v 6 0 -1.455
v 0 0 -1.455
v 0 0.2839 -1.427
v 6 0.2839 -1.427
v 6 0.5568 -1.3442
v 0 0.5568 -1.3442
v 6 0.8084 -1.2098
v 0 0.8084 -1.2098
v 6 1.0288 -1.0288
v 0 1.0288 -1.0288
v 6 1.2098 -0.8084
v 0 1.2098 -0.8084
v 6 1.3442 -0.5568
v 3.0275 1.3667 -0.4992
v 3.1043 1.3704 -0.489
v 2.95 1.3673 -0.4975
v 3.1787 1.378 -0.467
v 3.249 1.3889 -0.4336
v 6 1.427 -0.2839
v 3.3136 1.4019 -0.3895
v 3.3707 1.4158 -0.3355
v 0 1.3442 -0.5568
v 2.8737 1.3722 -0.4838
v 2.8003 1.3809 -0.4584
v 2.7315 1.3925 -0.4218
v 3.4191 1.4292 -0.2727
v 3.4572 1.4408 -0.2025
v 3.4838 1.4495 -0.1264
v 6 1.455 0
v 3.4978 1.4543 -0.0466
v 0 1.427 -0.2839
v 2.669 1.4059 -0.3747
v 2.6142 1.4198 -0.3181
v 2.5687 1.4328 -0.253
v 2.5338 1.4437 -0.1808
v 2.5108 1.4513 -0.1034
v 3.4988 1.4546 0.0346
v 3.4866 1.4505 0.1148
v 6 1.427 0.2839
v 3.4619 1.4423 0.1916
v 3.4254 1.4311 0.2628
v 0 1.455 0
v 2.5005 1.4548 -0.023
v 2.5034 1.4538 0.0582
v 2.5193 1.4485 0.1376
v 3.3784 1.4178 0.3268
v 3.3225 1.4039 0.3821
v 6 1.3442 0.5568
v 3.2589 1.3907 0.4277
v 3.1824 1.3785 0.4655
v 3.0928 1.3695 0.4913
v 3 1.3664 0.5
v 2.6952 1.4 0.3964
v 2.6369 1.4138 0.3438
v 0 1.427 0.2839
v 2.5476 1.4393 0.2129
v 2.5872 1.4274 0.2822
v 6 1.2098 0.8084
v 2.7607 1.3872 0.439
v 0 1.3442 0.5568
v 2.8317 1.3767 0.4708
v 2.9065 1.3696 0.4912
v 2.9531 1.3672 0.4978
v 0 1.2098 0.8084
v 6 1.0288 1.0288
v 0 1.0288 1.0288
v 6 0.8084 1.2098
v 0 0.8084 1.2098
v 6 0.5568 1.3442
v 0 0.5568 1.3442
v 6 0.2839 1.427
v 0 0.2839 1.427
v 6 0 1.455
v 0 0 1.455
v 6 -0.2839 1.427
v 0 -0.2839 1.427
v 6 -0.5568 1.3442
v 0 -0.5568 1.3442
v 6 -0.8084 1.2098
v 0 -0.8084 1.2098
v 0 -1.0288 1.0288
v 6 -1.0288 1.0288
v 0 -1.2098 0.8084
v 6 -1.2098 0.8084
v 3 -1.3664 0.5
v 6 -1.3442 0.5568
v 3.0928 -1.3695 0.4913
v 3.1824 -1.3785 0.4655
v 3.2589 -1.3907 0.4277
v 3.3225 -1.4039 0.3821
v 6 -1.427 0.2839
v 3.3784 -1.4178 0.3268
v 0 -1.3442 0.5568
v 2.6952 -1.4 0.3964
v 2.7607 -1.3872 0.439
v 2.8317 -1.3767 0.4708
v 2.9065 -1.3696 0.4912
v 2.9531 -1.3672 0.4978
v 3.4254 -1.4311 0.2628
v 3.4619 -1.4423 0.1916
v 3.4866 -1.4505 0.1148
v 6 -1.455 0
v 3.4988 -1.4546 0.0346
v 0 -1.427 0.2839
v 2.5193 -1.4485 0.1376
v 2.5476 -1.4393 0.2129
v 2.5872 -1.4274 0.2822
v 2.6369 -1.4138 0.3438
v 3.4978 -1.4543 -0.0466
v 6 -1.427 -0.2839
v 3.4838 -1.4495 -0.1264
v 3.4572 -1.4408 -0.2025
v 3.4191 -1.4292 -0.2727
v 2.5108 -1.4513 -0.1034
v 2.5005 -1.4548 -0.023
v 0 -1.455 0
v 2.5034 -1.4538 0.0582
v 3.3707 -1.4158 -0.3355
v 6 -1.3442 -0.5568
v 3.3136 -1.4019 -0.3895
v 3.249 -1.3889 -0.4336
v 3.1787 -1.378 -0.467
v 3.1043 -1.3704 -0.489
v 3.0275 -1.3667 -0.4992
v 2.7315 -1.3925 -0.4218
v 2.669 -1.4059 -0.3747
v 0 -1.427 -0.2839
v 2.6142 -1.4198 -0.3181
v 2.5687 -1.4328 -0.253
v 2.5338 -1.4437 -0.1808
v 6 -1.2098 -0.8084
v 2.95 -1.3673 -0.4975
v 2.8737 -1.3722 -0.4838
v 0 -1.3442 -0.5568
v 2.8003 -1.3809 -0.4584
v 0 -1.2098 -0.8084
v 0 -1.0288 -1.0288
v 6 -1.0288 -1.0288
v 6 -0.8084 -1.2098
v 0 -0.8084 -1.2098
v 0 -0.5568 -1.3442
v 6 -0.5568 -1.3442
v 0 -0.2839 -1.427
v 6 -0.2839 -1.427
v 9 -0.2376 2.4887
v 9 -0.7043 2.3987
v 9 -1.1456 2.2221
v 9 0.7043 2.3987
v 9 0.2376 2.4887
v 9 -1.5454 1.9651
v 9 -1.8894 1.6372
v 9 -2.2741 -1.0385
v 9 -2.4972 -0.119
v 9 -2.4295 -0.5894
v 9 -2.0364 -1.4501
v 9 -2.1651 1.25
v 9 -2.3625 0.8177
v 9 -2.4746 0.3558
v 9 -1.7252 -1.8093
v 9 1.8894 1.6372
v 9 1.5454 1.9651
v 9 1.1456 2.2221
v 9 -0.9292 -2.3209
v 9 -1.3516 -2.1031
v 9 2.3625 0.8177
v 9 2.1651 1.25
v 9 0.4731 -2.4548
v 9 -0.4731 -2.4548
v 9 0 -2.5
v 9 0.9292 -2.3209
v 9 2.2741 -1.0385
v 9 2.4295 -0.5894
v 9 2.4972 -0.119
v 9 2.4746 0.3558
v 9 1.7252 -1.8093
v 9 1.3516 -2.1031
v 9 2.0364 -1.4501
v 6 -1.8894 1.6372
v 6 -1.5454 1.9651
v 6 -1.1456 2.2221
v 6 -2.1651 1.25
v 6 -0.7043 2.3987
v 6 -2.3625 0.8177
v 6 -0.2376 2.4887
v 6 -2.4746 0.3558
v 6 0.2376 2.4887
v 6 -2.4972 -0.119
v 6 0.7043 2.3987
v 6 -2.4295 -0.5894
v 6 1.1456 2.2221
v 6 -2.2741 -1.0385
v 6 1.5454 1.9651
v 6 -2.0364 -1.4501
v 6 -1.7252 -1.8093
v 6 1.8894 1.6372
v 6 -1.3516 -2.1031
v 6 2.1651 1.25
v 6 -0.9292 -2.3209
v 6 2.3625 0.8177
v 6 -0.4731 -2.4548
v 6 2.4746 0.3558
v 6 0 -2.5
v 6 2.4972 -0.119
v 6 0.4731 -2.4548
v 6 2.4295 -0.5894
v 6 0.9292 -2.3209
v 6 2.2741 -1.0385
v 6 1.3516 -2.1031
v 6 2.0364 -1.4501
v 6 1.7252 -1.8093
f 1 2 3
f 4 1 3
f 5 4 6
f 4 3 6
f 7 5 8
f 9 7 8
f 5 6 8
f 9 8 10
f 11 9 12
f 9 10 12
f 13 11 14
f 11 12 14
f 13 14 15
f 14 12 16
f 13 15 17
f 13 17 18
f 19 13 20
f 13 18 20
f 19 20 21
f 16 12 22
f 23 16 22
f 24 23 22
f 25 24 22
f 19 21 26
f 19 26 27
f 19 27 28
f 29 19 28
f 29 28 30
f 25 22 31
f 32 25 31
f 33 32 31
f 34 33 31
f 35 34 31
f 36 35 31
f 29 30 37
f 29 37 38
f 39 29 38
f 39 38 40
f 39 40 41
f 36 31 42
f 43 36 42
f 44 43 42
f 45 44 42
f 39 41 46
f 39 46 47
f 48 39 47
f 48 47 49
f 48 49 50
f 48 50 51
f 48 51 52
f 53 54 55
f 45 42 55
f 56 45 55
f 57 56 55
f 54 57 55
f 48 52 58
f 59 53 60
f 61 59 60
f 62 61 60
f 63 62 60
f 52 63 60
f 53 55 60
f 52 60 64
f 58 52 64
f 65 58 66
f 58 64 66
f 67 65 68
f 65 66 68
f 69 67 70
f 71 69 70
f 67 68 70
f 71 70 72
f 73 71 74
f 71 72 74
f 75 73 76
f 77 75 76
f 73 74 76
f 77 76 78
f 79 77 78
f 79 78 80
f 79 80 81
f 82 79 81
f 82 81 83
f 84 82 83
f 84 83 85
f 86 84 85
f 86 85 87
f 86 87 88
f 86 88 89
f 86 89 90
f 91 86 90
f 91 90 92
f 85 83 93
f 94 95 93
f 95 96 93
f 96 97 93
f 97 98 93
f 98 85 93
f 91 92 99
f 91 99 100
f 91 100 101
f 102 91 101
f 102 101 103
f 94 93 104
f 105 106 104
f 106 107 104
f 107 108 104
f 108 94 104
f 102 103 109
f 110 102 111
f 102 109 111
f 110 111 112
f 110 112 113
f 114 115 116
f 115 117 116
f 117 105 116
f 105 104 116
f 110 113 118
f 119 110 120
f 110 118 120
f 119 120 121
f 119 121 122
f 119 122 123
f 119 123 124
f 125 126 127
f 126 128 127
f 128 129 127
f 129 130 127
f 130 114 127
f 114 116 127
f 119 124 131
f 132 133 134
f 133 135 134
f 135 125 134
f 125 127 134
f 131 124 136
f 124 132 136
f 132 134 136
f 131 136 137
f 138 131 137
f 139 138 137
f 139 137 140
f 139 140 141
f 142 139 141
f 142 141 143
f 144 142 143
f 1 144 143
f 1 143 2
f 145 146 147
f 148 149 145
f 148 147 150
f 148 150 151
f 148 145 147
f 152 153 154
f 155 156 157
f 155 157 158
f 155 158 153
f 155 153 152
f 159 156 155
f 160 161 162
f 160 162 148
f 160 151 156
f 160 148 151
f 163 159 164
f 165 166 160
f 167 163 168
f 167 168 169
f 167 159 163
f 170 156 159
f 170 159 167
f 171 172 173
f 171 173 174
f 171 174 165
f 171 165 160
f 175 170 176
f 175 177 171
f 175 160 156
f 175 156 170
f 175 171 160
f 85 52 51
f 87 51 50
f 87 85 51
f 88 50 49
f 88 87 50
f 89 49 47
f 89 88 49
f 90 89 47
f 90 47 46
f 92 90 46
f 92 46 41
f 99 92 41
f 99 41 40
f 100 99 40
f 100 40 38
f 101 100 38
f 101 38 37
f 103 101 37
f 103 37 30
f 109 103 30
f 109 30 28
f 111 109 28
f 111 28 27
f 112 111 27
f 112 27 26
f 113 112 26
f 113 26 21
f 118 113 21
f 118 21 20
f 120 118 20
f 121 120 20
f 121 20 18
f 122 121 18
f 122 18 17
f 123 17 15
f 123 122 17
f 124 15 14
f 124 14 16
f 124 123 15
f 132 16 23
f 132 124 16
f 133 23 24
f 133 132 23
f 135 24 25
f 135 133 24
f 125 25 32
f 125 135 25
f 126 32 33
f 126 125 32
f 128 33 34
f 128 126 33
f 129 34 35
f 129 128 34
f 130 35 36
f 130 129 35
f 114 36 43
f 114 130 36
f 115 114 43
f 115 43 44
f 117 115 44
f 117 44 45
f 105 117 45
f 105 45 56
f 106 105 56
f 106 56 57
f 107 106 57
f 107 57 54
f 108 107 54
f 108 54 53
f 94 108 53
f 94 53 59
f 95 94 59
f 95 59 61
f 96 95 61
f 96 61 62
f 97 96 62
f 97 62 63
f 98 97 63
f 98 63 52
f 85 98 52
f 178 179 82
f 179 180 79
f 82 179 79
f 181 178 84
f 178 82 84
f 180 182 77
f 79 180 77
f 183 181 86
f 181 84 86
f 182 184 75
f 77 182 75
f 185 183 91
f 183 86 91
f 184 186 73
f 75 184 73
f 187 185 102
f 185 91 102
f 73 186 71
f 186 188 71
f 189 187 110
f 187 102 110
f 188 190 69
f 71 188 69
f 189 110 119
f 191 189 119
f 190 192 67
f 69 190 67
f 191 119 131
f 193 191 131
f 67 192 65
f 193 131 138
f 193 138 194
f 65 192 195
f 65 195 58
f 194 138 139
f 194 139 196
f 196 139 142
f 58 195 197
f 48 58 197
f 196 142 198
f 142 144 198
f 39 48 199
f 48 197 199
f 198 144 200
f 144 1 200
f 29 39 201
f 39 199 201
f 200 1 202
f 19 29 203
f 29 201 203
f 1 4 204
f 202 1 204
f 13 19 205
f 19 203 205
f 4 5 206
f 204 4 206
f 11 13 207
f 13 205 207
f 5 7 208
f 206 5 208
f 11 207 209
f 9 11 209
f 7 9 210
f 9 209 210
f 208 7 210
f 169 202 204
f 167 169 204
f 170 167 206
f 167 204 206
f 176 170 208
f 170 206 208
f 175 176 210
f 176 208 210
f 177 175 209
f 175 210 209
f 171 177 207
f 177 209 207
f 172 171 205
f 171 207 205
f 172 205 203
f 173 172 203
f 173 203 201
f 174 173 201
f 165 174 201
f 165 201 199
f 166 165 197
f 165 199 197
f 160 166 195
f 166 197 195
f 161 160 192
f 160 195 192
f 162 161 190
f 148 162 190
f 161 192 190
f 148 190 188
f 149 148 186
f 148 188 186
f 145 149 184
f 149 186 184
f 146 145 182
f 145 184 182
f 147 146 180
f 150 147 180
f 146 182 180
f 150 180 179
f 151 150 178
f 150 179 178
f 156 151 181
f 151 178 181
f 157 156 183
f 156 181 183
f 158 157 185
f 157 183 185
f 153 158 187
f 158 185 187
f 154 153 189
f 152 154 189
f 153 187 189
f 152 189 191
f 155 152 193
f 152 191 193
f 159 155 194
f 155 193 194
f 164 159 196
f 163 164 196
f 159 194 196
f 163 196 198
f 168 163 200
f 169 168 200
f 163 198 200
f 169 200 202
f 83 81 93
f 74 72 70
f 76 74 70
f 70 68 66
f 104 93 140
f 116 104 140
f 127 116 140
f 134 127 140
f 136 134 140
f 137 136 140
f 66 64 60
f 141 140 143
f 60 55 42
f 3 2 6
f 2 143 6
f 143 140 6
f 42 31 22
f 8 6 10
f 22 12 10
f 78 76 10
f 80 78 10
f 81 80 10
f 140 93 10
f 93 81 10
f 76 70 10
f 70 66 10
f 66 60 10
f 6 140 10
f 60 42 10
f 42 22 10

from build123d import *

# Parameters (mm, degrees)
SKETCH2_R               = 1.455
BOSS_EXTRUDE3_DEPTH     = 6
SKETCH3_R               = 2.5
BOSS_EXTRUDE4_DEPTH     = 3
CUT_EXTRUDE1_DEPTH      = 10.669539803
CUT_EXTRUDE1_DEPTH_BACK = 10.669539803
SKETCH4_R               = 0.5


with BuildPart() as part:
    # Sketch2 → Boss-Extrude3 (new body)
    with BuildSketch(Plane(origin=(0, 0, 0), x_dir=(0, 0, -1), z_dir=(1, 0, 0))):
        Circle(SKETCH2_R)
    extrude(amount=BOSS_EXTRUDE3_DEPTH)

    # Sketch3 → Boss-Extrude4 (add)
    with BuildSketch(Plane(origin=(6, 0, 0), x_dir=(0, 0, -1), z_dir=(1, 0, 0))):
        Circle(SKETCH3_R)
    extrude(amount=BOSS_EXTRUDE4_DEPTH)

    # Sketch4 → Cut-Extrude1 (cut, two sides: drawn at the far end of the back side and taken through both)
    with BuildSketch(Plane(origin=(0, 0, 0), x_dir=(1, 0, 0), z_dir=(0, 1, 0)).offset(-CUT_EXTRUDE1_DEPTH_BACK)):
        with Locations(Location((3, 0, 0), (0, 0, 270))):
            Circle(SKETCH4_R)
    extrude(amount=CUT_EXTRUDE1_DEPTH + CUT_EXTRUDE1_DEPTH_BACK, mode=Mode.SUBTRACT)


solid = part.part
